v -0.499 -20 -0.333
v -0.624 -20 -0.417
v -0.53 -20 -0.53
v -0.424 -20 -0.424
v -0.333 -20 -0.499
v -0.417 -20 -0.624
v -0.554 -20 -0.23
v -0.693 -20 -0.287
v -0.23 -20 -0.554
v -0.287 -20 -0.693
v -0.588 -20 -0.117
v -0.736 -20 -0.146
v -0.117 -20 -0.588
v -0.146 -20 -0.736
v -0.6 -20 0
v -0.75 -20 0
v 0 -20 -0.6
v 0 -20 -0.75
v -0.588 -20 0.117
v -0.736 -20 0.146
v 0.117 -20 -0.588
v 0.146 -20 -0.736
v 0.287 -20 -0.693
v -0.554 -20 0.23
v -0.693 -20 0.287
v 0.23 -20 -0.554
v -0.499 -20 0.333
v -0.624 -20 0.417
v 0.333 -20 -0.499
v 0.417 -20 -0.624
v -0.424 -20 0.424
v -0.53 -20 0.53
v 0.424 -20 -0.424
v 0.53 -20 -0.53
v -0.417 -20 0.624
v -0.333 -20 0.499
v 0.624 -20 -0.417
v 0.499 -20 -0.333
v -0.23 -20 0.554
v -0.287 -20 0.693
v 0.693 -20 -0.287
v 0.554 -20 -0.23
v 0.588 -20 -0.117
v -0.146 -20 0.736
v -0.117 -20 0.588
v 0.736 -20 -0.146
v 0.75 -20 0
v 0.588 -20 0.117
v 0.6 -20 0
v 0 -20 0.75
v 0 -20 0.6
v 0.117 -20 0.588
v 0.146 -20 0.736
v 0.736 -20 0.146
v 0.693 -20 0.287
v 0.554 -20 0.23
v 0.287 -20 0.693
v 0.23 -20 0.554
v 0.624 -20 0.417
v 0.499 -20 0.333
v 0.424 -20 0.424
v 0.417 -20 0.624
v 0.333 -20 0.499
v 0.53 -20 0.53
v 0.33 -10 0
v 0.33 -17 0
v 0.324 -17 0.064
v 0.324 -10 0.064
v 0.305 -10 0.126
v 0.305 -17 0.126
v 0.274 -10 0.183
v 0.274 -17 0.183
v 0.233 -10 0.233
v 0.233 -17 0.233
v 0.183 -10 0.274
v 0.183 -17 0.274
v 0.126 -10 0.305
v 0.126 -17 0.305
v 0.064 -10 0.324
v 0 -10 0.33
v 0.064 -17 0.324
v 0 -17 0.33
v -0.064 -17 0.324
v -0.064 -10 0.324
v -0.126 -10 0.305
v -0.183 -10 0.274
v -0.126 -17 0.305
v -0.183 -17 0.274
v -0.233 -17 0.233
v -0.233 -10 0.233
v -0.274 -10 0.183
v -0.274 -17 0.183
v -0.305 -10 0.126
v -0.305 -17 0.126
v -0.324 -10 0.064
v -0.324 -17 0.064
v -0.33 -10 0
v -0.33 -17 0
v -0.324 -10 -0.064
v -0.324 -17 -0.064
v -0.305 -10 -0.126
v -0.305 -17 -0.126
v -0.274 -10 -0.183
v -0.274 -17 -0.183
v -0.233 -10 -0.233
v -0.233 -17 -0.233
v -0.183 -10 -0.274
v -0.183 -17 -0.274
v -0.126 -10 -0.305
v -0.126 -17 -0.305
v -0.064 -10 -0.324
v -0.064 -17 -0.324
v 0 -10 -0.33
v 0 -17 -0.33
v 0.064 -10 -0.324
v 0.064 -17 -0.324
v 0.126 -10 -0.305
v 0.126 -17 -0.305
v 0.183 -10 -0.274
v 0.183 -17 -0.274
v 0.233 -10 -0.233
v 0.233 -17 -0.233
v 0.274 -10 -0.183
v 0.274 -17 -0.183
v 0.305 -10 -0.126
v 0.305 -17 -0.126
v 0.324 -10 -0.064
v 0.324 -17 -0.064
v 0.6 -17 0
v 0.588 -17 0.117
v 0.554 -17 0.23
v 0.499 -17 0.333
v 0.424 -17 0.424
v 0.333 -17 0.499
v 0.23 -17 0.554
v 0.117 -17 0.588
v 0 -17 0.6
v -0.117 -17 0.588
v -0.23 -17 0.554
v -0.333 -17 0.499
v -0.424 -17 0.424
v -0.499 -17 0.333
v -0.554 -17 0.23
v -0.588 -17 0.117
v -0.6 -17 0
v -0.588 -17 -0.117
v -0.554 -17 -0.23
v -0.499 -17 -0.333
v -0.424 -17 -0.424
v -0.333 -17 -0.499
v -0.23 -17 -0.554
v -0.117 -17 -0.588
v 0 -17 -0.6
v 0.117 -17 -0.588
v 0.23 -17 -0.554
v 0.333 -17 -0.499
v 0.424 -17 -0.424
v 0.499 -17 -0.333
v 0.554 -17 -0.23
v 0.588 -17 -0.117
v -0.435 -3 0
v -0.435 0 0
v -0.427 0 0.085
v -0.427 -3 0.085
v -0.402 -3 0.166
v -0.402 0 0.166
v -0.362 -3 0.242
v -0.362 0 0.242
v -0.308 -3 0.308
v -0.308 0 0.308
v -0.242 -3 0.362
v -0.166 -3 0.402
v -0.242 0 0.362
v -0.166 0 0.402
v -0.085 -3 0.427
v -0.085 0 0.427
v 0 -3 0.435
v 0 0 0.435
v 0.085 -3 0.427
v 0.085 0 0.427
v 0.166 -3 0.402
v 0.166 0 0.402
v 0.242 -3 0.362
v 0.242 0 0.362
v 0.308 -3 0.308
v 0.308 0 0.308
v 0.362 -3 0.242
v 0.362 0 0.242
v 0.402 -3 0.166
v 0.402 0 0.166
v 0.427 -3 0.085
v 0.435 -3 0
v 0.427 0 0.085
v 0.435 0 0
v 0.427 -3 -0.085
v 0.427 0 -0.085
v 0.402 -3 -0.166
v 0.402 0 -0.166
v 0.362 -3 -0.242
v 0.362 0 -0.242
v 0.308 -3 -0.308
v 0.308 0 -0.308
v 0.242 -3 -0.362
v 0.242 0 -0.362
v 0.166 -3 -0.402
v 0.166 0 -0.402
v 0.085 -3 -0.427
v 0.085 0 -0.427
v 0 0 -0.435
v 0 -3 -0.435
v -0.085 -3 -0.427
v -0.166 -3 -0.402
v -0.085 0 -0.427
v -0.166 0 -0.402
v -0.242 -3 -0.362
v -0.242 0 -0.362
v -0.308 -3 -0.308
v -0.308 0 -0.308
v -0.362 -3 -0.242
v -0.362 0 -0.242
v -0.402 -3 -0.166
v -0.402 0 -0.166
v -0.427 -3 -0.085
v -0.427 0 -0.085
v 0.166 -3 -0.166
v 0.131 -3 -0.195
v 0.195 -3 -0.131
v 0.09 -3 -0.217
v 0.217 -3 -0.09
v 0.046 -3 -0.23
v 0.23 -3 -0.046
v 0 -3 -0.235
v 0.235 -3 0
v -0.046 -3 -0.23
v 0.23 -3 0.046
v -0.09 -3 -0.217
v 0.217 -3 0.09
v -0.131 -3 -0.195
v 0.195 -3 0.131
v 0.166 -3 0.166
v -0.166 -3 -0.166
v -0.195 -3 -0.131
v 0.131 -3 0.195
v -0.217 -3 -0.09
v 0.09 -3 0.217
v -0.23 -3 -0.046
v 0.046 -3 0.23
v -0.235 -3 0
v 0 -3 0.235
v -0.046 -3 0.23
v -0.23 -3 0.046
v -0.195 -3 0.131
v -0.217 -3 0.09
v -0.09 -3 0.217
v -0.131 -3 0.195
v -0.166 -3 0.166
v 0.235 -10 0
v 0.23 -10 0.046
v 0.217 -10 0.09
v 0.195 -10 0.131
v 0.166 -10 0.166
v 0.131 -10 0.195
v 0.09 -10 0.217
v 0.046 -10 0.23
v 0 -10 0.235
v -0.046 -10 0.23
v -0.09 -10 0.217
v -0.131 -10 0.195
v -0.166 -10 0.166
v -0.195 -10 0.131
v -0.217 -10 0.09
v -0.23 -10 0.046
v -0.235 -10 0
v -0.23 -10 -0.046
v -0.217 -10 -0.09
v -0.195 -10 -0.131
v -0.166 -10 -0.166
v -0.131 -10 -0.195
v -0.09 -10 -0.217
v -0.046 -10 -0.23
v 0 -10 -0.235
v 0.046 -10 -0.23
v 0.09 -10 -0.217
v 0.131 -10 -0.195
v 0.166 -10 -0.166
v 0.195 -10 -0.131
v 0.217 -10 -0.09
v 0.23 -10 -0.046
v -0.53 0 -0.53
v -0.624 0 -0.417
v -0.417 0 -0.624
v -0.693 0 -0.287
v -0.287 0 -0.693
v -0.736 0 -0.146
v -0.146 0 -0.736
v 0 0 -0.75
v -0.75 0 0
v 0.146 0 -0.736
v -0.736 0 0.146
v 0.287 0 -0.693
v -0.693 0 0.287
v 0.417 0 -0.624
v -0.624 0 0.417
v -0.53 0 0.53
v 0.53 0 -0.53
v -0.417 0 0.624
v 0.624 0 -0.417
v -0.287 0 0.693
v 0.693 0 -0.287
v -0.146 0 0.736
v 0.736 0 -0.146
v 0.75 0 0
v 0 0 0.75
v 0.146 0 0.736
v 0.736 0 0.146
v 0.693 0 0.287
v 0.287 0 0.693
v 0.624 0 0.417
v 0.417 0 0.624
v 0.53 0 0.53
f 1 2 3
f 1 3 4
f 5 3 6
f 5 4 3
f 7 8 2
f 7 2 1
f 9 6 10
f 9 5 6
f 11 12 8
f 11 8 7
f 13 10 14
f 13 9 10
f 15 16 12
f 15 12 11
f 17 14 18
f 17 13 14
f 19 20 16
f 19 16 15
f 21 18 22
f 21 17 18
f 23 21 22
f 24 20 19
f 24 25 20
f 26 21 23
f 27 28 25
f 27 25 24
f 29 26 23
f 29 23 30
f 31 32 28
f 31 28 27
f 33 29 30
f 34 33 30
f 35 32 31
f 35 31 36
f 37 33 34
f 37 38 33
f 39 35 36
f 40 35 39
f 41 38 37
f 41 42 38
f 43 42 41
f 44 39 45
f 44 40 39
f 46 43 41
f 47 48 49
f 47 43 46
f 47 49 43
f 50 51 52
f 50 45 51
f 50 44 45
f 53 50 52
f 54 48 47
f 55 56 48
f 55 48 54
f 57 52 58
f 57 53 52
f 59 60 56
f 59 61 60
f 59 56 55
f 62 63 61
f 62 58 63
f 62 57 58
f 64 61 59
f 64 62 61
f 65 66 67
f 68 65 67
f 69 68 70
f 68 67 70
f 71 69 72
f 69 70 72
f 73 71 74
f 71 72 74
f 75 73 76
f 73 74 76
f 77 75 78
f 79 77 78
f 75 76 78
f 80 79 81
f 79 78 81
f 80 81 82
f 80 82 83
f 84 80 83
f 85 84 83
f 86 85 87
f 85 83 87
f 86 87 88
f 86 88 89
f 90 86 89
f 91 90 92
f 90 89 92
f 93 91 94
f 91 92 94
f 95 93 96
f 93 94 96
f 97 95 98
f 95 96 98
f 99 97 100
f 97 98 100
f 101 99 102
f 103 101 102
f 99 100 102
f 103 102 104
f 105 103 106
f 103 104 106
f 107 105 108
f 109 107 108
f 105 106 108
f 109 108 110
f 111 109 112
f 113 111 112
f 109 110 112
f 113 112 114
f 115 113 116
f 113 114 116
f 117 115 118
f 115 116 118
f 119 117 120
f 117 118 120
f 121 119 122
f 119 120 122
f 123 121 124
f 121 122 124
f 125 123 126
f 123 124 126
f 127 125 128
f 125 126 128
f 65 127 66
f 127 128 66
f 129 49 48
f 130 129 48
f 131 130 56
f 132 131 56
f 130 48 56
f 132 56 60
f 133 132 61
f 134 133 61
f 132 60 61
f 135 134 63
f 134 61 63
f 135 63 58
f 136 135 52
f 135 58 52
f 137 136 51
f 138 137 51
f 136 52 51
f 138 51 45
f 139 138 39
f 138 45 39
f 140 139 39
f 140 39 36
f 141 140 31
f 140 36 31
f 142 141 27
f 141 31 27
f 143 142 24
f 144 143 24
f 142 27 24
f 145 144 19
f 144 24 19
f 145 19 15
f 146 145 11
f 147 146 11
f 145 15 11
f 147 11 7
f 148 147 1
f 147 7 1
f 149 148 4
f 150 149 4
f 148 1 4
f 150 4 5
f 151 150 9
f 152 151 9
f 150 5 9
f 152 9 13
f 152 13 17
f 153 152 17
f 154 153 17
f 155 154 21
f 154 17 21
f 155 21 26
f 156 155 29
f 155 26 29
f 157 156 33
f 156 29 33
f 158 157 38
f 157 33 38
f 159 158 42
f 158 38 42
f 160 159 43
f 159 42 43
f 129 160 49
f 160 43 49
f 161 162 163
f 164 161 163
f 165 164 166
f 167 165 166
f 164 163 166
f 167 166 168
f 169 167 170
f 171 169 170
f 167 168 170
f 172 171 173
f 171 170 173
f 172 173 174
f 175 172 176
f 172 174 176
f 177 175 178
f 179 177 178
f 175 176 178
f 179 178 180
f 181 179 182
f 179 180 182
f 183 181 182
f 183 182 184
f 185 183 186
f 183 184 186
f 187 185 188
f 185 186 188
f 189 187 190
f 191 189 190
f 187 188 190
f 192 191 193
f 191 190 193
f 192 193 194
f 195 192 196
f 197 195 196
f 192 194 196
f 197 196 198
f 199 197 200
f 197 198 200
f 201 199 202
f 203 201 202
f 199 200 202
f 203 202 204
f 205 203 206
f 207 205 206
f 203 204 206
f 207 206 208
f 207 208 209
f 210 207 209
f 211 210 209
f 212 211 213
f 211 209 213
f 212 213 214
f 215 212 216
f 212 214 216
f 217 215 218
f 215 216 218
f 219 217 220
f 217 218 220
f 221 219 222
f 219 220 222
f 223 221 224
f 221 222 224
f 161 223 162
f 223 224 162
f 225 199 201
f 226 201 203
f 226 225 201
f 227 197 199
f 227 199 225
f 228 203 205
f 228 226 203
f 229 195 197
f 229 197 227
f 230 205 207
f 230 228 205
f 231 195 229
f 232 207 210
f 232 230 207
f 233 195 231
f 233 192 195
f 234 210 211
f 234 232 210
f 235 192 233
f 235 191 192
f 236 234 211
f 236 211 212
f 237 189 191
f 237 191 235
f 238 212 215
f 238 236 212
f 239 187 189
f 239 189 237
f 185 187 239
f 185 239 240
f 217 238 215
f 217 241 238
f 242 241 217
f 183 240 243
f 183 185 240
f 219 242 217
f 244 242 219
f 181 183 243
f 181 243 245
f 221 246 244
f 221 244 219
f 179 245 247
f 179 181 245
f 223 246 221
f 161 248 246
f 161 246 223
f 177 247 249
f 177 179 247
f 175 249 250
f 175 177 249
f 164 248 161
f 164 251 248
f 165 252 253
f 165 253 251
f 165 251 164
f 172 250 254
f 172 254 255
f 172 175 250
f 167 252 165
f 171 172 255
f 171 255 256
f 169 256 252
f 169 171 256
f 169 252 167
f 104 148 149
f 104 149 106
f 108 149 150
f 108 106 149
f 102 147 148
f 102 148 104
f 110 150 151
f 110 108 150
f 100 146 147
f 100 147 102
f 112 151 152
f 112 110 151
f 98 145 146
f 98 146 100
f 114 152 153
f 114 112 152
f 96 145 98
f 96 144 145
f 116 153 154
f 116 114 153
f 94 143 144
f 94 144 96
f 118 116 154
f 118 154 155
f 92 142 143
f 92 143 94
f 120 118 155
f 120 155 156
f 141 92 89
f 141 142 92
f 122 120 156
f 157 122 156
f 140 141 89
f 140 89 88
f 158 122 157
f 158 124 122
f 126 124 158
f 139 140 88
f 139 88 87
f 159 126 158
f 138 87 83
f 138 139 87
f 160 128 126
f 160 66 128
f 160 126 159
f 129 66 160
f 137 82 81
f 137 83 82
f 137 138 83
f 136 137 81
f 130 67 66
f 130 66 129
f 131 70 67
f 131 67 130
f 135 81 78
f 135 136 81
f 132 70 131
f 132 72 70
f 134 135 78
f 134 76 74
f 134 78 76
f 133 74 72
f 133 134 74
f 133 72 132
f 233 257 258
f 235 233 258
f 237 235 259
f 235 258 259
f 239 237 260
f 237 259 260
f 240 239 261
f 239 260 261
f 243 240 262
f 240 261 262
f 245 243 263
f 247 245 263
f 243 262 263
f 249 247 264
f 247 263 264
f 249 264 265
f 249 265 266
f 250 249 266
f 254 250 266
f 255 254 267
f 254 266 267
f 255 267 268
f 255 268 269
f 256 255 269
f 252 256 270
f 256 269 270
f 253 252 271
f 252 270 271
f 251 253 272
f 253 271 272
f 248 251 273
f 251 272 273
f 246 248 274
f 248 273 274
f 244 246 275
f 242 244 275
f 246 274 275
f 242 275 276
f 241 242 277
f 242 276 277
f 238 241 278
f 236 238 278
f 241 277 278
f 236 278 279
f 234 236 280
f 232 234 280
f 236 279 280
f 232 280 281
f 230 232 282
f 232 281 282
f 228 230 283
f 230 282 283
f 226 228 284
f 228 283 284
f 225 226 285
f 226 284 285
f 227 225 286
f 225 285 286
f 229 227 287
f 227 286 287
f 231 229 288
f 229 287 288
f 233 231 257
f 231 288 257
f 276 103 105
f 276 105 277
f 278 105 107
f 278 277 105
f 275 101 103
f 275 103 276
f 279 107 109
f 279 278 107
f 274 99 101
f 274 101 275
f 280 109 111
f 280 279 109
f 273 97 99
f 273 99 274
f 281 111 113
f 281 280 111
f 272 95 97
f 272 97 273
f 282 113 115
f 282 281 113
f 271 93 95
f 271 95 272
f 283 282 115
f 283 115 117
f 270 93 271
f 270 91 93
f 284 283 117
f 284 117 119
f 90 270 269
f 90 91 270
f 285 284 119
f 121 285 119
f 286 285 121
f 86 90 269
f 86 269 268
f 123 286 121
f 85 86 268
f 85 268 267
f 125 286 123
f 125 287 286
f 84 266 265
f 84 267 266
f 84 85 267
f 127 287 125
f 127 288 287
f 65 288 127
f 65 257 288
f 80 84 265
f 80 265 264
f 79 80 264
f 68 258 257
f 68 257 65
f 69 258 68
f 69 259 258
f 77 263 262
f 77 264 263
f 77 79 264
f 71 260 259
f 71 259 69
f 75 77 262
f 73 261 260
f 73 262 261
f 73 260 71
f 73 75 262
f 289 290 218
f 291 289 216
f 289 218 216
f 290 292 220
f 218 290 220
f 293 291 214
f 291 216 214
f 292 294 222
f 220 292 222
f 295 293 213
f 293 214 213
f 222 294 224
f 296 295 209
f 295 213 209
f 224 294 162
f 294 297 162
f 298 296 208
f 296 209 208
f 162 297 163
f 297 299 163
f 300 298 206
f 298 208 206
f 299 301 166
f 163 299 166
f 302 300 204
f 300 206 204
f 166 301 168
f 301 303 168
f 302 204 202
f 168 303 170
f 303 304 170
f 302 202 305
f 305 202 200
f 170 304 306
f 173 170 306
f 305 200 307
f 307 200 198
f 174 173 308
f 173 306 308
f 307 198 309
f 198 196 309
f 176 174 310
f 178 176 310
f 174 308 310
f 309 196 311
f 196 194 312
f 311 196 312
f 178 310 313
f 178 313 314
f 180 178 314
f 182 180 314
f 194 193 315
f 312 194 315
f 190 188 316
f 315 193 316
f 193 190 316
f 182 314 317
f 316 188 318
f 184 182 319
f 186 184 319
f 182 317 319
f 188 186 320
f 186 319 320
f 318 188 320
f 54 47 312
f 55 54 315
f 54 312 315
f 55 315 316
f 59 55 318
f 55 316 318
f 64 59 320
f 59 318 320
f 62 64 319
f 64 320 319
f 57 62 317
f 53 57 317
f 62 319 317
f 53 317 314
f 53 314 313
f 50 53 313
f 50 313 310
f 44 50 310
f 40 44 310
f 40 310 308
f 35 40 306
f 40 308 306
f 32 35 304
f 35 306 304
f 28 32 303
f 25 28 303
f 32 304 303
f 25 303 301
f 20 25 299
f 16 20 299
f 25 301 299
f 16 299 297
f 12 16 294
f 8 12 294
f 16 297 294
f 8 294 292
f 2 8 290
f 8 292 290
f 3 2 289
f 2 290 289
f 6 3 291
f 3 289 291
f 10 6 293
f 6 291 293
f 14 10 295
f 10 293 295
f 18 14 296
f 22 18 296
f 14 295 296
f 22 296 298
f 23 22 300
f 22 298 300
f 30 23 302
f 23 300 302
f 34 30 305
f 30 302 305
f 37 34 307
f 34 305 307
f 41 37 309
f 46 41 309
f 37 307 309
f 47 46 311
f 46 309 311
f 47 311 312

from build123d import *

# Parameters (mm, degrees)
F0_R     = 0.75
F1_DEPTH = 20
F2_R     = 0.6
F3_DEPTH = 3
F4_R     = 0.33
F5_DEPTH = 7
F6_R     = 0.235
F7_DEPTH = 7
F8_R     = 0.435
F9_DEPTH = 3


with BuildPart() as f1:
    # F0 (on Front) → F1 (new body)
    with BuildSketch(Plane.XZ):
        Circle(F0_R)
    extrude(amount=F1_DEPTH)

    # F2 (on face) → F3 (cut)
    with BuildSketch(Plane.XZ.offset(20)):
        Circle(F2_R)
    extrude(amount=-F3_DEPTH, mode=Mode.SUBTRACT)

    # F4 (on face) → F5 (cut)
    with BuildSketch(Plane.XZ.offset(17)):
        Circle(F4_R)
    extrude(amount=-F5_DEPTH, mode=Mode.SUBTRACT)

    # F6 (on face) + F4 (on face) → F7 (cut)
    with BuildSketch(Plane.XZ.offset(10)):
        Circle(F6_R)
    with BuildSketch(Plane.XZ.offset(17)):
        Circle(F4_R)
    extrude(amount=-F7_DEPTH, mode=Mode.SUBTRACT)

    # F8 (on face) → F9 (cut)
    with BuildSketch(Plane(origin=(0, 0, 0), x_dir=(-1, 0, 0), z_dir=(0, 1, 0))):
        Circle(F8_R)
    extrude(amount=-F9_DEPTH, mode=Mode.SUBTRACT)


solid = f1.part
